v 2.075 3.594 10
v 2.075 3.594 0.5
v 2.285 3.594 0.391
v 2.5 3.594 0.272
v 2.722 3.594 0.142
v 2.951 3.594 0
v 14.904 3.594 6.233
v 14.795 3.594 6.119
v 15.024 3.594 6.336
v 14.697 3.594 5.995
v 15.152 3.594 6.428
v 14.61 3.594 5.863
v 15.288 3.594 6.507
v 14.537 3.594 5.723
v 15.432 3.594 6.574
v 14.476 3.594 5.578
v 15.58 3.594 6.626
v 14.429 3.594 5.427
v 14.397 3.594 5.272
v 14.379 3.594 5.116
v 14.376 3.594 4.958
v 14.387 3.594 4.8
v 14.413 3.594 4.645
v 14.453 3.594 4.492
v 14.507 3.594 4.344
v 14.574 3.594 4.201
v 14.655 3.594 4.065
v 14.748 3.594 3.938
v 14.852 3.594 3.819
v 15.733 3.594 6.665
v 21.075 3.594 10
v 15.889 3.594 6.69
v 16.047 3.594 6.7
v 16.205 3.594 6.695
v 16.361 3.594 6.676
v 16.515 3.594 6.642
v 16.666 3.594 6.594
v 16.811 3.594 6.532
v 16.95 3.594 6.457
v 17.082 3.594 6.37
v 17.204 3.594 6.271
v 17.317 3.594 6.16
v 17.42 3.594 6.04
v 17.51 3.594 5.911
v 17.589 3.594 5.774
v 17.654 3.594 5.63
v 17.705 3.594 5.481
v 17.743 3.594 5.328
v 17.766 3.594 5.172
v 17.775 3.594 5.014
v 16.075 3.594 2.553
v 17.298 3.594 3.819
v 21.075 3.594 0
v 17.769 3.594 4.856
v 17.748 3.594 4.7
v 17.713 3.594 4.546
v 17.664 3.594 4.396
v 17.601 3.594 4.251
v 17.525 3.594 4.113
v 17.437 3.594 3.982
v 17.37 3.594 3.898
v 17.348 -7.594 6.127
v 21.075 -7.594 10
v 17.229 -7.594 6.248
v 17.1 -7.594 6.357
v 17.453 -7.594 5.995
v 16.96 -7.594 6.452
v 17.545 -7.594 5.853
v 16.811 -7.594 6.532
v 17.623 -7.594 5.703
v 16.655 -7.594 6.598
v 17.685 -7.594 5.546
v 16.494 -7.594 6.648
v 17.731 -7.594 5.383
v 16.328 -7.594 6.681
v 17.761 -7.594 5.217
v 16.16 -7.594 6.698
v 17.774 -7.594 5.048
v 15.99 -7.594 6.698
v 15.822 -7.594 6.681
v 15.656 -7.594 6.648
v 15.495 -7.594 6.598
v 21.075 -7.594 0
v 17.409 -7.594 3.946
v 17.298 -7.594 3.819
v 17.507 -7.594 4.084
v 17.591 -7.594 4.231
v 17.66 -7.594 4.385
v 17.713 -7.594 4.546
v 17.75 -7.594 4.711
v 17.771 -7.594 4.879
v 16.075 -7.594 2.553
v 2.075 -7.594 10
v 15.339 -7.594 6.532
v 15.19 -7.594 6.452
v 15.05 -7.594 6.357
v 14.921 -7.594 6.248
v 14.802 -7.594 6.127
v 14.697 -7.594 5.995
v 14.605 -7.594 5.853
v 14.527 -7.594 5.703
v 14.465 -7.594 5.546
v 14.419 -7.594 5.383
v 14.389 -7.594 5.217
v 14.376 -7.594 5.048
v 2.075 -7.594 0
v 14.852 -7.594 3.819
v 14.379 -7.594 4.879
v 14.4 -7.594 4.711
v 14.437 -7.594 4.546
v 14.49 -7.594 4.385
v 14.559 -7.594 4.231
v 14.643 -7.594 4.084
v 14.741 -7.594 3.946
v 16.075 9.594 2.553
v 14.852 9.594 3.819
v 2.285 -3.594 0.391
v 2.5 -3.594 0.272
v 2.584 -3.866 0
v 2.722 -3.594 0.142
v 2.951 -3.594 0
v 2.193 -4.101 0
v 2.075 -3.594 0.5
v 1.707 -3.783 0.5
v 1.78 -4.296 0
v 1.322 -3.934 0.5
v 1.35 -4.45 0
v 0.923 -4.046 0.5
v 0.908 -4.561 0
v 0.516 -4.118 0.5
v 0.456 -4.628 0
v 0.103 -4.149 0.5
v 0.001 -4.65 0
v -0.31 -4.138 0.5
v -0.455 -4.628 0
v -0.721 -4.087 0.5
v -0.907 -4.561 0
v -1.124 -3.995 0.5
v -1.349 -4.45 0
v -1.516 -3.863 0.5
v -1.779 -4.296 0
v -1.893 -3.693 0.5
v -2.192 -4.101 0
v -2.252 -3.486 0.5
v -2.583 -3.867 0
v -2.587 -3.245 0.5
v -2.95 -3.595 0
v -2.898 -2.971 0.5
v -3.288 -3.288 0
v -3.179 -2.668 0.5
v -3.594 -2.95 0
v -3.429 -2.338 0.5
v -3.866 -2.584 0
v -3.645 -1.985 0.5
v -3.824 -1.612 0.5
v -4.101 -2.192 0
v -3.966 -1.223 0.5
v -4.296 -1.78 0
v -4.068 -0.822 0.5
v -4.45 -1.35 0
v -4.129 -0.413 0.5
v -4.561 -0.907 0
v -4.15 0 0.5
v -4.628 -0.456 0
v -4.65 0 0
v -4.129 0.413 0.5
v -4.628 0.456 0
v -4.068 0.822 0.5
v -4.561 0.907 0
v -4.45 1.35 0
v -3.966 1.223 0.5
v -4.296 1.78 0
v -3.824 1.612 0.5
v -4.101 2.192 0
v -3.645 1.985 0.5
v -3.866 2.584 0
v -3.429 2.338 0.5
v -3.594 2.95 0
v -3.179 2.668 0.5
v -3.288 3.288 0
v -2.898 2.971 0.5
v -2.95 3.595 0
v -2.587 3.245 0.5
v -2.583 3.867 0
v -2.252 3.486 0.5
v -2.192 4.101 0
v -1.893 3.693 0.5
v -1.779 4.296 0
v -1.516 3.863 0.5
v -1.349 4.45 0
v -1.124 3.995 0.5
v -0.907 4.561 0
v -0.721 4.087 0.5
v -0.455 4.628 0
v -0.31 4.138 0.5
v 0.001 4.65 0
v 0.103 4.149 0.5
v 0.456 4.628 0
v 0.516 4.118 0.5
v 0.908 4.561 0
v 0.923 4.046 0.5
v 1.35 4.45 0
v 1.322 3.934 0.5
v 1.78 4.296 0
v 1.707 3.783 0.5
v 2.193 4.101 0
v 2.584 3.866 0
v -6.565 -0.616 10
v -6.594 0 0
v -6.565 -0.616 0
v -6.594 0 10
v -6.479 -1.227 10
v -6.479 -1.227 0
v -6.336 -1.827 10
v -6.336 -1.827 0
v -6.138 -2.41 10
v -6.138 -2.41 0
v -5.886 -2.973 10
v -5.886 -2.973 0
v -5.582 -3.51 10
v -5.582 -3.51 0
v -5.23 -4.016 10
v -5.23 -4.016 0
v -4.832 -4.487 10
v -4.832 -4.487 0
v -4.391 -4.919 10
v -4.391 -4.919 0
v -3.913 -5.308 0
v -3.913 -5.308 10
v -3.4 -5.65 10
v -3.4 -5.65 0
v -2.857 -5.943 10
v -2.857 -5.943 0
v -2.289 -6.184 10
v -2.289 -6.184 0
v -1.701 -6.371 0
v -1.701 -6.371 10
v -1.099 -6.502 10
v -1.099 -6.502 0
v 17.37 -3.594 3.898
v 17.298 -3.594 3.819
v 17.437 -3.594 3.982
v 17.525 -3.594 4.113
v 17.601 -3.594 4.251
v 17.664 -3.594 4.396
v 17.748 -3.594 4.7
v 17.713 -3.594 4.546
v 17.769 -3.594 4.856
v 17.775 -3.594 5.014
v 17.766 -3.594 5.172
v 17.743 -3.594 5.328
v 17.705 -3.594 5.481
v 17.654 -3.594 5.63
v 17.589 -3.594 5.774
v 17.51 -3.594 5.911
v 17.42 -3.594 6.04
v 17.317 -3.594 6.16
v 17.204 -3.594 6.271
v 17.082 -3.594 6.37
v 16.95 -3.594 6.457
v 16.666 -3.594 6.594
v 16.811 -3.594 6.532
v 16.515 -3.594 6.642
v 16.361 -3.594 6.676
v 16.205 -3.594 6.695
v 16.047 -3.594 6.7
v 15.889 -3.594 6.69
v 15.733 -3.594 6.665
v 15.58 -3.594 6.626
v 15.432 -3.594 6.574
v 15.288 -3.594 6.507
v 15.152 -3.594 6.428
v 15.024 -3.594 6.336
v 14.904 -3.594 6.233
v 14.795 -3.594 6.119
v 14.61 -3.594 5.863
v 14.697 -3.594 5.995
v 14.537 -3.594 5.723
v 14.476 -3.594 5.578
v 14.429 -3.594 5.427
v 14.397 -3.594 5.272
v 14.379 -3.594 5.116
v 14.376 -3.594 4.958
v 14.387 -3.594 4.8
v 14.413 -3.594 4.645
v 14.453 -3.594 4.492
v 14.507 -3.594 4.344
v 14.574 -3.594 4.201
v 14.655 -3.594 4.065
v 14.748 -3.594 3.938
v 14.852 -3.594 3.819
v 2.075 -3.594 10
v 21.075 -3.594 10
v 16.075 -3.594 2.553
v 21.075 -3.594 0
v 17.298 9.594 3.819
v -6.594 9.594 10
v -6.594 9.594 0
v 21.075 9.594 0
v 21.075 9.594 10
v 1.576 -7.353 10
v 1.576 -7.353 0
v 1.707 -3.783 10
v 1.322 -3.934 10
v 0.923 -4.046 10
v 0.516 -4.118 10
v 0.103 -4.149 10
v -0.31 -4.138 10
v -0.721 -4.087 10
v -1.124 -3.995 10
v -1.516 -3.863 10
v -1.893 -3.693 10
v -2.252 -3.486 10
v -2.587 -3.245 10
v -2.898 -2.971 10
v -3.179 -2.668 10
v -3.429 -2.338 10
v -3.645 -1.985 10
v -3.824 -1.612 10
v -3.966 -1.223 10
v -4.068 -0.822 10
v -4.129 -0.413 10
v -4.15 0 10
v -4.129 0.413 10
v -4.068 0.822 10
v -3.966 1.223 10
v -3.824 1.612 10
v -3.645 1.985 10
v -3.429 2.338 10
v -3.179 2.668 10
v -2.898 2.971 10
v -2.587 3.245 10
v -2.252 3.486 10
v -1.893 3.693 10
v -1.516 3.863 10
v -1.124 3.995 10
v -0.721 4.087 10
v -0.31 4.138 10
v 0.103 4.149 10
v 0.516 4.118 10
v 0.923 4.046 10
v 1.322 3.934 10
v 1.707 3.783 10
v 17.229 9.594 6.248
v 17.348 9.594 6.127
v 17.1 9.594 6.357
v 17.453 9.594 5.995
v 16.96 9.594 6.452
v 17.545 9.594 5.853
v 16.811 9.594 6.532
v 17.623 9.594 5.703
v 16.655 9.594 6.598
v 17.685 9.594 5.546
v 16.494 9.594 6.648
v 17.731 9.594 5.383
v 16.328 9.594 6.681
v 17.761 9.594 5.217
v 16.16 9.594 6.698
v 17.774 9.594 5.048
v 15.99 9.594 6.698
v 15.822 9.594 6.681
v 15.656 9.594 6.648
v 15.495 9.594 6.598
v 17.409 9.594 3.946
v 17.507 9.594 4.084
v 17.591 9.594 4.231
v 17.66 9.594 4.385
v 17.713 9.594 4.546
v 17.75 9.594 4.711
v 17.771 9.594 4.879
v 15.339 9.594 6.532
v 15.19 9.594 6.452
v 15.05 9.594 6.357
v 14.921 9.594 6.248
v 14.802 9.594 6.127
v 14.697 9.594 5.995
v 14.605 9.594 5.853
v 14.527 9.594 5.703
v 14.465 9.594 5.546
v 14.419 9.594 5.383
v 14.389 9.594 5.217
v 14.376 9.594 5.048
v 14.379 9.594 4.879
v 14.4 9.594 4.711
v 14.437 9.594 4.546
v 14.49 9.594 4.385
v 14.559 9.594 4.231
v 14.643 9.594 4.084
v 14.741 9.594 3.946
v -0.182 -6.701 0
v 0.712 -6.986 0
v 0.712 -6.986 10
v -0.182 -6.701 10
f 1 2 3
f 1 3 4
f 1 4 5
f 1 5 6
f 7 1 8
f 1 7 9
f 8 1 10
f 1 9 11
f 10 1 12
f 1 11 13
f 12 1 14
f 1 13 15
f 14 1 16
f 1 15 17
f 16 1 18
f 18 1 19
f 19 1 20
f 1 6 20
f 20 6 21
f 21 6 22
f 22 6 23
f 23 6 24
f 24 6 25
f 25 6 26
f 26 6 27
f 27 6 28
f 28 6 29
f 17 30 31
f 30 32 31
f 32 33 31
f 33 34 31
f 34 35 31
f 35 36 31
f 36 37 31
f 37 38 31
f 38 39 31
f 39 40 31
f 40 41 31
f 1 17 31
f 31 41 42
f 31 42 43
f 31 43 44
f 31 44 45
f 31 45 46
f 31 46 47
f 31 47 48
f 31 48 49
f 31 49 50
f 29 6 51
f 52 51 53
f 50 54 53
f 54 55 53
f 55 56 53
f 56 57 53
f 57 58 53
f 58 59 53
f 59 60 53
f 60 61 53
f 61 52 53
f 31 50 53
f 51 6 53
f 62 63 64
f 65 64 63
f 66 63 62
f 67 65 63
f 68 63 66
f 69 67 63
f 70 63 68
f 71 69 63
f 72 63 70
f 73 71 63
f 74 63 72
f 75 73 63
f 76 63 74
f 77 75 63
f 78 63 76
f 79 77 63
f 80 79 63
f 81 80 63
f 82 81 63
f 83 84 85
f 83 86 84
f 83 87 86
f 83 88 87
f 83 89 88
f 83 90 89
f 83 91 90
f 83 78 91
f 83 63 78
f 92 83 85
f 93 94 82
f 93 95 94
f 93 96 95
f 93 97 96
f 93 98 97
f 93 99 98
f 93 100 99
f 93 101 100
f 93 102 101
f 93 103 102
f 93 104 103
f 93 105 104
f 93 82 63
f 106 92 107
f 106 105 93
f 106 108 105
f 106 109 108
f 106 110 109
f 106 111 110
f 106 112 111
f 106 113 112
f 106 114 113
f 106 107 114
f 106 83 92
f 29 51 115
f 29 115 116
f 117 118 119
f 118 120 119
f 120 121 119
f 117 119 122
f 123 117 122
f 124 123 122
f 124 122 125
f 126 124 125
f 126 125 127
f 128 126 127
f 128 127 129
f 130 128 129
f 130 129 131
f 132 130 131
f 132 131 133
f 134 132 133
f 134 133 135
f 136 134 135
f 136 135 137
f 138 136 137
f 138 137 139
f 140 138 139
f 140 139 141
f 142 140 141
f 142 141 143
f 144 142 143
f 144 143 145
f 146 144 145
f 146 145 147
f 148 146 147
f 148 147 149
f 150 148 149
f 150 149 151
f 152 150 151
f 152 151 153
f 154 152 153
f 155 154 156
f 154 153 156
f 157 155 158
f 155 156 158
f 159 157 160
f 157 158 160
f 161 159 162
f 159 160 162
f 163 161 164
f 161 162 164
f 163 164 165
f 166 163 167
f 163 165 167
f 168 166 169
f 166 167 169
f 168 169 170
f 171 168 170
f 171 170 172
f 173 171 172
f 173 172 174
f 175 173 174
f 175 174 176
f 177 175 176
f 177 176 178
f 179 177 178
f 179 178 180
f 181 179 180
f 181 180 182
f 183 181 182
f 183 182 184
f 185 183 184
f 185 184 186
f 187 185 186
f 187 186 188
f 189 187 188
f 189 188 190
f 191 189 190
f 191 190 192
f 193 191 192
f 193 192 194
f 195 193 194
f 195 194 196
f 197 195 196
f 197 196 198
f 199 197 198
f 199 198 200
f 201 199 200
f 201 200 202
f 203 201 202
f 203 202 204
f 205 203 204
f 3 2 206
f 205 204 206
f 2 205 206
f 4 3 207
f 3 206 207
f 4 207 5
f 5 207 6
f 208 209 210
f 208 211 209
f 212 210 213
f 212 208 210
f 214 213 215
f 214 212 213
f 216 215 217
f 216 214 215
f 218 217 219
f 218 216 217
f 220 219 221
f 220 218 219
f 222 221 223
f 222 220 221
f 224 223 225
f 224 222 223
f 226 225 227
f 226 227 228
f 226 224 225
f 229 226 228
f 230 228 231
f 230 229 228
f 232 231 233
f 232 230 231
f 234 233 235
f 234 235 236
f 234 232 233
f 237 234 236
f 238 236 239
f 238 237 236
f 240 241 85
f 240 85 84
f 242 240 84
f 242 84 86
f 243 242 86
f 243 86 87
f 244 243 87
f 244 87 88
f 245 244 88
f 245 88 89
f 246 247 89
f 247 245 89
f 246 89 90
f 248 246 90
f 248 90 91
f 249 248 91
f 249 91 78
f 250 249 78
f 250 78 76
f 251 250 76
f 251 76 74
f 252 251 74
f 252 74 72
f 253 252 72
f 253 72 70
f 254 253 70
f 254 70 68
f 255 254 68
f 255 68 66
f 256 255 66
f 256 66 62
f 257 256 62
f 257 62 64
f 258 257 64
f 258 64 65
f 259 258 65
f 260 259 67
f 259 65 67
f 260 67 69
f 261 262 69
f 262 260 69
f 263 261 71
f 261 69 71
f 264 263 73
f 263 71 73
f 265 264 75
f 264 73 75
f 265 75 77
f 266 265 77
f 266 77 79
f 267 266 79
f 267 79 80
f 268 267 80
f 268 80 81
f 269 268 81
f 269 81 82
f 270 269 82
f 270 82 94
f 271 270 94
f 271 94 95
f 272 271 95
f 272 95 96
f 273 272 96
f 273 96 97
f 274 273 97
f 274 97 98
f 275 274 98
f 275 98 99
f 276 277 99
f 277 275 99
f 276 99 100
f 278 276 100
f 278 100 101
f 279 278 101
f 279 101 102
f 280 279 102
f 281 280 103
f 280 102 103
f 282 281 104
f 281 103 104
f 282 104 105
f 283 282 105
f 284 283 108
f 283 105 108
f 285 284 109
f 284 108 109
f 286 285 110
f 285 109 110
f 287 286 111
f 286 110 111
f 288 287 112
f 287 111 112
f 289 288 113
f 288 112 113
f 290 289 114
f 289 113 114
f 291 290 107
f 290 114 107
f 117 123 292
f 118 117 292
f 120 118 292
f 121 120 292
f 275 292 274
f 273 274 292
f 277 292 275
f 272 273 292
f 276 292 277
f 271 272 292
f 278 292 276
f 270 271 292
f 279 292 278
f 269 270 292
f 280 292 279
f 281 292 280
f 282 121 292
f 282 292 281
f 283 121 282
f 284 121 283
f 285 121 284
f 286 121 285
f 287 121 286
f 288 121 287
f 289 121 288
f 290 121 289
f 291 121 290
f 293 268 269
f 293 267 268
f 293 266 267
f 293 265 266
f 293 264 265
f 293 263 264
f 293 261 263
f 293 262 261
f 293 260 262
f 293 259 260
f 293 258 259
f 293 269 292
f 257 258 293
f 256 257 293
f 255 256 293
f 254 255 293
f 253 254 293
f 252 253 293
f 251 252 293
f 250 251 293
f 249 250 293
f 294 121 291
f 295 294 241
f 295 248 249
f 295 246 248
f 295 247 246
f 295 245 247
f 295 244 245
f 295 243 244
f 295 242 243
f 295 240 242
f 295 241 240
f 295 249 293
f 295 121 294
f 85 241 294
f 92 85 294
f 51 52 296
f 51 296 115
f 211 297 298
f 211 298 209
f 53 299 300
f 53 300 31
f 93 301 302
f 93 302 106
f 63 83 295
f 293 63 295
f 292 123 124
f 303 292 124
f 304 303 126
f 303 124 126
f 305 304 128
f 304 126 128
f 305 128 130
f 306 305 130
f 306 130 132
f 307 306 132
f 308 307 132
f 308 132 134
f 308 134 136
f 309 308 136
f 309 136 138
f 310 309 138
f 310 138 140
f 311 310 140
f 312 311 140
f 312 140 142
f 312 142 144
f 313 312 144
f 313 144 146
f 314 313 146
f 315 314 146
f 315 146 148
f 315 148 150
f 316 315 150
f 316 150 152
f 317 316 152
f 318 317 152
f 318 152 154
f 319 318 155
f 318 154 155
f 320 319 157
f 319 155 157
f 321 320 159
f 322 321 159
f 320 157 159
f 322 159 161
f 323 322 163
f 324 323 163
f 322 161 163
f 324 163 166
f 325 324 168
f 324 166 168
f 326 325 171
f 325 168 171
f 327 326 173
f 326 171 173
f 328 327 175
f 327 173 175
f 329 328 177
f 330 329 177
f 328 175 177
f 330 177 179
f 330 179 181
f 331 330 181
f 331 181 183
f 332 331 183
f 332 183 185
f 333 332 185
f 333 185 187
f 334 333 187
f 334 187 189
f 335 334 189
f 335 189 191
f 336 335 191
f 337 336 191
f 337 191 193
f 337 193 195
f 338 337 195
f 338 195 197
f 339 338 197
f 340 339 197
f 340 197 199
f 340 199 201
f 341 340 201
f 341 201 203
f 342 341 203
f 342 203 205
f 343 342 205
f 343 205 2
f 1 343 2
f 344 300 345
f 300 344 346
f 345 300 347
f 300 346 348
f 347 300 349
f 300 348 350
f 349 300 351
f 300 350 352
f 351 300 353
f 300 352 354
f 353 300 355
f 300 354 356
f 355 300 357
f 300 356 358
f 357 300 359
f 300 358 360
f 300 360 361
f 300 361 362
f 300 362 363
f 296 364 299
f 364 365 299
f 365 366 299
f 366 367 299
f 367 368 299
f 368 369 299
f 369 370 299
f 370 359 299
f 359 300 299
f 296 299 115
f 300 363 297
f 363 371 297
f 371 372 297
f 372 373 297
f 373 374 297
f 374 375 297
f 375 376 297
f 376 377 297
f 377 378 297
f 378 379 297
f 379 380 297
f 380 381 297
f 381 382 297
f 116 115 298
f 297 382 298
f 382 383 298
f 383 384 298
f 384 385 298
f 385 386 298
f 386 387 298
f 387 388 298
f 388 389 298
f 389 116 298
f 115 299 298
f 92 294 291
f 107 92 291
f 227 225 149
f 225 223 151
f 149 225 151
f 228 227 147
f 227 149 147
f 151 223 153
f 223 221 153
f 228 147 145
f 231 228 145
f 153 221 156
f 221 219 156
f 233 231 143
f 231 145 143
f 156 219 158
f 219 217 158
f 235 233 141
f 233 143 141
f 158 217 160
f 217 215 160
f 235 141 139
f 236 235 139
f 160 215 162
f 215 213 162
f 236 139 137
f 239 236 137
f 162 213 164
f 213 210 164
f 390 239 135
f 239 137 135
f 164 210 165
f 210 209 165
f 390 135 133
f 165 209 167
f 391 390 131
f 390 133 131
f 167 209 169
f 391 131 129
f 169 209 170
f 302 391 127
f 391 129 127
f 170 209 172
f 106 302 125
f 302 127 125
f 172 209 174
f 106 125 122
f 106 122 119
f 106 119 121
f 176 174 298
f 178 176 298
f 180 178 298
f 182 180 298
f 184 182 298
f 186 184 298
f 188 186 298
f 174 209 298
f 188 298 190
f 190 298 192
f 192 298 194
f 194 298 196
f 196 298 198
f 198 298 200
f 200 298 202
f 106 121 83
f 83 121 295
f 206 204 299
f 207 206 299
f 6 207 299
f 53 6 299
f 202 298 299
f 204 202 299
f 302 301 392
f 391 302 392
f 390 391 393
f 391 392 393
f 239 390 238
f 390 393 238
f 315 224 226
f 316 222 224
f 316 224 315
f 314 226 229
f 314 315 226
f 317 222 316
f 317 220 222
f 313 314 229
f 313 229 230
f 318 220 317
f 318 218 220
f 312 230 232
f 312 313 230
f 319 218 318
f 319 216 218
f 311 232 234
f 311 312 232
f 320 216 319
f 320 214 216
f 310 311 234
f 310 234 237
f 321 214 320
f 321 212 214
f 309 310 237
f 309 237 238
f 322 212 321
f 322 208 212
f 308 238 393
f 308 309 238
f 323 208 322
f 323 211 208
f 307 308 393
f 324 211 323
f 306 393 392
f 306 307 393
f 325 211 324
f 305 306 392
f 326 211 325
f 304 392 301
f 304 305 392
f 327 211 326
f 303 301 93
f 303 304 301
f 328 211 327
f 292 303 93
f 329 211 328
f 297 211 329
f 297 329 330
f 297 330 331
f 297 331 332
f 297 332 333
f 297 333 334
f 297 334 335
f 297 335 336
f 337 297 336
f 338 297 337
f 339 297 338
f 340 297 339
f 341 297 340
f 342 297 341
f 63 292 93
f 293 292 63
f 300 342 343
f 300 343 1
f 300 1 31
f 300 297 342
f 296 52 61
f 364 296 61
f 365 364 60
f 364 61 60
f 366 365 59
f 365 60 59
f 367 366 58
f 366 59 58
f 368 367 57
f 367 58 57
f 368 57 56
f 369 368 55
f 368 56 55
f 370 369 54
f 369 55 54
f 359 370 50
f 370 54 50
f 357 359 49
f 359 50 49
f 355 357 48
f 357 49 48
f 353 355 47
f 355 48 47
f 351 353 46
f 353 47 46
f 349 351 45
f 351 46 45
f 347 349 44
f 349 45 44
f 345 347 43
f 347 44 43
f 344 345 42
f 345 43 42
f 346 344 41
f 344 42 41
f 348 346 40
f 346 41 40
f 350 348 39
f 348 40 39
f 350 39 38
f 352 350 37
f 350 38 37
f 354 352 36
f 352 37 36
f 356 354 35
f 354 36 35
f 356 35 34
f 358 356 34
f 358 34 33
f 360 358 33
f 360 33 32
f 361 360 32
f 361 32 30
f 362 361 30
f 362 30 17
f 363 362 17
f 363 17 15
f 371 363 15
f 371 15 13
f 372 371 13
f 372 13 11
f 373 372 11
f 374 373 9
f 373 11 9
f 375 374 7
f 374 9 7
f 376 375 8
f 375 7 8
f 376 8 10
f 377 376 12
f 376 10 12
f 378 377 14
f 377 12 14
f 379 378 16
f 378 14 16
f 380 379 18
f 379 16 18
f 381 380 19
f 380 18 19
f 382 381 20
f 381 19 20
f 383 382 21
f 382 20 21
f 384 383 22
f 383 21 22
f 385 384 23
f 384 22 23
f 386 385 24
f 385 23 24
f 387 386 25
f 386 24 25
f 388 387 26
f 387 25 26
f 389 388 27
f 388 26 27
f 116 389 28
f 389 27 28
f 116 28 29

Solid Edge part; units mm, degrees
sketch "Sketch1" plane through (0, 0, 0) normal (0, 0, 1) x (1, 0, 0)
  line L0 (2.075, 3.594) -> (21.075, 3.594)
  line L1 (21.075, 9.594) -> (21.075, 3.594)
  line L2 (21.075, 9.594) -> (-7.594, 9.594)
  line L3 (-7.594, 0) -> (-7.594, 9.594)
  line L4 (21.075, -7.594) -> (0, -7.594)
  line L5 (21.075, -7.594) -> (21.075, -3.594)
  line L6 (2.075, -3.594) -> (21.075, -3.594)
  arc A0 (2.075, -3.594) -> (2.075, 3.594) centre (0, 0) cw
  arc A1 (-7.594, 0) -> (0, -7.594) centre (0, 0) ccw
extrude "Protrusion1" add sketch "Sketch1" along normal blind 10
sketch "Sketch2" plane through (-2.2595, 7.594, 5) normal (0, 1, 0) x (1, 0, 0)
  line L0 (19.5574, 1.1809) -> (18.3345, 2.4472)
  line L1 (18.3345, 2.4472) -> (17.1116, 1.1809)
  arc A0 (19.5574, 1.1809) -> (17.1116, 1.1809) centre (18.3345, 0) cw
extrude "Cutout1" cut sketch "Sketch2" along normal through all and the other way through all
sketch "Sketch3" plane through (6.7405, 1, 10) normal (0, 0, 1) x (1, 0, 0)
  line L0 (-14.3345, 8.594) -> (-13.3345, 8.594)
  line L1 (-13.3345, 8.594) -> (-13.3345, -1)
  arc A0 (-13.3345, -1) -> (-7.8394, -7.5018) centre (-6.7405, -1) ccw
  arc A1 (-5.1645, -8.3535) -> (-7.8394, -7.5018) centre (-9.506, -17.3619) ccw
  line L2 (-5.1645, -8.3535) -> (-4.6655, -8.594)
  dimension "D1" = 1
extrude "Cutout2" cut sketch "Sketch3" against normal through all material side at (-7.094, 9.544, 10)
chamfer "Chamfer_2" distance 0.5 angle 45 1 edges at (-4.15, 0, 0)
properties material "ABS Plastic, medium impact"
